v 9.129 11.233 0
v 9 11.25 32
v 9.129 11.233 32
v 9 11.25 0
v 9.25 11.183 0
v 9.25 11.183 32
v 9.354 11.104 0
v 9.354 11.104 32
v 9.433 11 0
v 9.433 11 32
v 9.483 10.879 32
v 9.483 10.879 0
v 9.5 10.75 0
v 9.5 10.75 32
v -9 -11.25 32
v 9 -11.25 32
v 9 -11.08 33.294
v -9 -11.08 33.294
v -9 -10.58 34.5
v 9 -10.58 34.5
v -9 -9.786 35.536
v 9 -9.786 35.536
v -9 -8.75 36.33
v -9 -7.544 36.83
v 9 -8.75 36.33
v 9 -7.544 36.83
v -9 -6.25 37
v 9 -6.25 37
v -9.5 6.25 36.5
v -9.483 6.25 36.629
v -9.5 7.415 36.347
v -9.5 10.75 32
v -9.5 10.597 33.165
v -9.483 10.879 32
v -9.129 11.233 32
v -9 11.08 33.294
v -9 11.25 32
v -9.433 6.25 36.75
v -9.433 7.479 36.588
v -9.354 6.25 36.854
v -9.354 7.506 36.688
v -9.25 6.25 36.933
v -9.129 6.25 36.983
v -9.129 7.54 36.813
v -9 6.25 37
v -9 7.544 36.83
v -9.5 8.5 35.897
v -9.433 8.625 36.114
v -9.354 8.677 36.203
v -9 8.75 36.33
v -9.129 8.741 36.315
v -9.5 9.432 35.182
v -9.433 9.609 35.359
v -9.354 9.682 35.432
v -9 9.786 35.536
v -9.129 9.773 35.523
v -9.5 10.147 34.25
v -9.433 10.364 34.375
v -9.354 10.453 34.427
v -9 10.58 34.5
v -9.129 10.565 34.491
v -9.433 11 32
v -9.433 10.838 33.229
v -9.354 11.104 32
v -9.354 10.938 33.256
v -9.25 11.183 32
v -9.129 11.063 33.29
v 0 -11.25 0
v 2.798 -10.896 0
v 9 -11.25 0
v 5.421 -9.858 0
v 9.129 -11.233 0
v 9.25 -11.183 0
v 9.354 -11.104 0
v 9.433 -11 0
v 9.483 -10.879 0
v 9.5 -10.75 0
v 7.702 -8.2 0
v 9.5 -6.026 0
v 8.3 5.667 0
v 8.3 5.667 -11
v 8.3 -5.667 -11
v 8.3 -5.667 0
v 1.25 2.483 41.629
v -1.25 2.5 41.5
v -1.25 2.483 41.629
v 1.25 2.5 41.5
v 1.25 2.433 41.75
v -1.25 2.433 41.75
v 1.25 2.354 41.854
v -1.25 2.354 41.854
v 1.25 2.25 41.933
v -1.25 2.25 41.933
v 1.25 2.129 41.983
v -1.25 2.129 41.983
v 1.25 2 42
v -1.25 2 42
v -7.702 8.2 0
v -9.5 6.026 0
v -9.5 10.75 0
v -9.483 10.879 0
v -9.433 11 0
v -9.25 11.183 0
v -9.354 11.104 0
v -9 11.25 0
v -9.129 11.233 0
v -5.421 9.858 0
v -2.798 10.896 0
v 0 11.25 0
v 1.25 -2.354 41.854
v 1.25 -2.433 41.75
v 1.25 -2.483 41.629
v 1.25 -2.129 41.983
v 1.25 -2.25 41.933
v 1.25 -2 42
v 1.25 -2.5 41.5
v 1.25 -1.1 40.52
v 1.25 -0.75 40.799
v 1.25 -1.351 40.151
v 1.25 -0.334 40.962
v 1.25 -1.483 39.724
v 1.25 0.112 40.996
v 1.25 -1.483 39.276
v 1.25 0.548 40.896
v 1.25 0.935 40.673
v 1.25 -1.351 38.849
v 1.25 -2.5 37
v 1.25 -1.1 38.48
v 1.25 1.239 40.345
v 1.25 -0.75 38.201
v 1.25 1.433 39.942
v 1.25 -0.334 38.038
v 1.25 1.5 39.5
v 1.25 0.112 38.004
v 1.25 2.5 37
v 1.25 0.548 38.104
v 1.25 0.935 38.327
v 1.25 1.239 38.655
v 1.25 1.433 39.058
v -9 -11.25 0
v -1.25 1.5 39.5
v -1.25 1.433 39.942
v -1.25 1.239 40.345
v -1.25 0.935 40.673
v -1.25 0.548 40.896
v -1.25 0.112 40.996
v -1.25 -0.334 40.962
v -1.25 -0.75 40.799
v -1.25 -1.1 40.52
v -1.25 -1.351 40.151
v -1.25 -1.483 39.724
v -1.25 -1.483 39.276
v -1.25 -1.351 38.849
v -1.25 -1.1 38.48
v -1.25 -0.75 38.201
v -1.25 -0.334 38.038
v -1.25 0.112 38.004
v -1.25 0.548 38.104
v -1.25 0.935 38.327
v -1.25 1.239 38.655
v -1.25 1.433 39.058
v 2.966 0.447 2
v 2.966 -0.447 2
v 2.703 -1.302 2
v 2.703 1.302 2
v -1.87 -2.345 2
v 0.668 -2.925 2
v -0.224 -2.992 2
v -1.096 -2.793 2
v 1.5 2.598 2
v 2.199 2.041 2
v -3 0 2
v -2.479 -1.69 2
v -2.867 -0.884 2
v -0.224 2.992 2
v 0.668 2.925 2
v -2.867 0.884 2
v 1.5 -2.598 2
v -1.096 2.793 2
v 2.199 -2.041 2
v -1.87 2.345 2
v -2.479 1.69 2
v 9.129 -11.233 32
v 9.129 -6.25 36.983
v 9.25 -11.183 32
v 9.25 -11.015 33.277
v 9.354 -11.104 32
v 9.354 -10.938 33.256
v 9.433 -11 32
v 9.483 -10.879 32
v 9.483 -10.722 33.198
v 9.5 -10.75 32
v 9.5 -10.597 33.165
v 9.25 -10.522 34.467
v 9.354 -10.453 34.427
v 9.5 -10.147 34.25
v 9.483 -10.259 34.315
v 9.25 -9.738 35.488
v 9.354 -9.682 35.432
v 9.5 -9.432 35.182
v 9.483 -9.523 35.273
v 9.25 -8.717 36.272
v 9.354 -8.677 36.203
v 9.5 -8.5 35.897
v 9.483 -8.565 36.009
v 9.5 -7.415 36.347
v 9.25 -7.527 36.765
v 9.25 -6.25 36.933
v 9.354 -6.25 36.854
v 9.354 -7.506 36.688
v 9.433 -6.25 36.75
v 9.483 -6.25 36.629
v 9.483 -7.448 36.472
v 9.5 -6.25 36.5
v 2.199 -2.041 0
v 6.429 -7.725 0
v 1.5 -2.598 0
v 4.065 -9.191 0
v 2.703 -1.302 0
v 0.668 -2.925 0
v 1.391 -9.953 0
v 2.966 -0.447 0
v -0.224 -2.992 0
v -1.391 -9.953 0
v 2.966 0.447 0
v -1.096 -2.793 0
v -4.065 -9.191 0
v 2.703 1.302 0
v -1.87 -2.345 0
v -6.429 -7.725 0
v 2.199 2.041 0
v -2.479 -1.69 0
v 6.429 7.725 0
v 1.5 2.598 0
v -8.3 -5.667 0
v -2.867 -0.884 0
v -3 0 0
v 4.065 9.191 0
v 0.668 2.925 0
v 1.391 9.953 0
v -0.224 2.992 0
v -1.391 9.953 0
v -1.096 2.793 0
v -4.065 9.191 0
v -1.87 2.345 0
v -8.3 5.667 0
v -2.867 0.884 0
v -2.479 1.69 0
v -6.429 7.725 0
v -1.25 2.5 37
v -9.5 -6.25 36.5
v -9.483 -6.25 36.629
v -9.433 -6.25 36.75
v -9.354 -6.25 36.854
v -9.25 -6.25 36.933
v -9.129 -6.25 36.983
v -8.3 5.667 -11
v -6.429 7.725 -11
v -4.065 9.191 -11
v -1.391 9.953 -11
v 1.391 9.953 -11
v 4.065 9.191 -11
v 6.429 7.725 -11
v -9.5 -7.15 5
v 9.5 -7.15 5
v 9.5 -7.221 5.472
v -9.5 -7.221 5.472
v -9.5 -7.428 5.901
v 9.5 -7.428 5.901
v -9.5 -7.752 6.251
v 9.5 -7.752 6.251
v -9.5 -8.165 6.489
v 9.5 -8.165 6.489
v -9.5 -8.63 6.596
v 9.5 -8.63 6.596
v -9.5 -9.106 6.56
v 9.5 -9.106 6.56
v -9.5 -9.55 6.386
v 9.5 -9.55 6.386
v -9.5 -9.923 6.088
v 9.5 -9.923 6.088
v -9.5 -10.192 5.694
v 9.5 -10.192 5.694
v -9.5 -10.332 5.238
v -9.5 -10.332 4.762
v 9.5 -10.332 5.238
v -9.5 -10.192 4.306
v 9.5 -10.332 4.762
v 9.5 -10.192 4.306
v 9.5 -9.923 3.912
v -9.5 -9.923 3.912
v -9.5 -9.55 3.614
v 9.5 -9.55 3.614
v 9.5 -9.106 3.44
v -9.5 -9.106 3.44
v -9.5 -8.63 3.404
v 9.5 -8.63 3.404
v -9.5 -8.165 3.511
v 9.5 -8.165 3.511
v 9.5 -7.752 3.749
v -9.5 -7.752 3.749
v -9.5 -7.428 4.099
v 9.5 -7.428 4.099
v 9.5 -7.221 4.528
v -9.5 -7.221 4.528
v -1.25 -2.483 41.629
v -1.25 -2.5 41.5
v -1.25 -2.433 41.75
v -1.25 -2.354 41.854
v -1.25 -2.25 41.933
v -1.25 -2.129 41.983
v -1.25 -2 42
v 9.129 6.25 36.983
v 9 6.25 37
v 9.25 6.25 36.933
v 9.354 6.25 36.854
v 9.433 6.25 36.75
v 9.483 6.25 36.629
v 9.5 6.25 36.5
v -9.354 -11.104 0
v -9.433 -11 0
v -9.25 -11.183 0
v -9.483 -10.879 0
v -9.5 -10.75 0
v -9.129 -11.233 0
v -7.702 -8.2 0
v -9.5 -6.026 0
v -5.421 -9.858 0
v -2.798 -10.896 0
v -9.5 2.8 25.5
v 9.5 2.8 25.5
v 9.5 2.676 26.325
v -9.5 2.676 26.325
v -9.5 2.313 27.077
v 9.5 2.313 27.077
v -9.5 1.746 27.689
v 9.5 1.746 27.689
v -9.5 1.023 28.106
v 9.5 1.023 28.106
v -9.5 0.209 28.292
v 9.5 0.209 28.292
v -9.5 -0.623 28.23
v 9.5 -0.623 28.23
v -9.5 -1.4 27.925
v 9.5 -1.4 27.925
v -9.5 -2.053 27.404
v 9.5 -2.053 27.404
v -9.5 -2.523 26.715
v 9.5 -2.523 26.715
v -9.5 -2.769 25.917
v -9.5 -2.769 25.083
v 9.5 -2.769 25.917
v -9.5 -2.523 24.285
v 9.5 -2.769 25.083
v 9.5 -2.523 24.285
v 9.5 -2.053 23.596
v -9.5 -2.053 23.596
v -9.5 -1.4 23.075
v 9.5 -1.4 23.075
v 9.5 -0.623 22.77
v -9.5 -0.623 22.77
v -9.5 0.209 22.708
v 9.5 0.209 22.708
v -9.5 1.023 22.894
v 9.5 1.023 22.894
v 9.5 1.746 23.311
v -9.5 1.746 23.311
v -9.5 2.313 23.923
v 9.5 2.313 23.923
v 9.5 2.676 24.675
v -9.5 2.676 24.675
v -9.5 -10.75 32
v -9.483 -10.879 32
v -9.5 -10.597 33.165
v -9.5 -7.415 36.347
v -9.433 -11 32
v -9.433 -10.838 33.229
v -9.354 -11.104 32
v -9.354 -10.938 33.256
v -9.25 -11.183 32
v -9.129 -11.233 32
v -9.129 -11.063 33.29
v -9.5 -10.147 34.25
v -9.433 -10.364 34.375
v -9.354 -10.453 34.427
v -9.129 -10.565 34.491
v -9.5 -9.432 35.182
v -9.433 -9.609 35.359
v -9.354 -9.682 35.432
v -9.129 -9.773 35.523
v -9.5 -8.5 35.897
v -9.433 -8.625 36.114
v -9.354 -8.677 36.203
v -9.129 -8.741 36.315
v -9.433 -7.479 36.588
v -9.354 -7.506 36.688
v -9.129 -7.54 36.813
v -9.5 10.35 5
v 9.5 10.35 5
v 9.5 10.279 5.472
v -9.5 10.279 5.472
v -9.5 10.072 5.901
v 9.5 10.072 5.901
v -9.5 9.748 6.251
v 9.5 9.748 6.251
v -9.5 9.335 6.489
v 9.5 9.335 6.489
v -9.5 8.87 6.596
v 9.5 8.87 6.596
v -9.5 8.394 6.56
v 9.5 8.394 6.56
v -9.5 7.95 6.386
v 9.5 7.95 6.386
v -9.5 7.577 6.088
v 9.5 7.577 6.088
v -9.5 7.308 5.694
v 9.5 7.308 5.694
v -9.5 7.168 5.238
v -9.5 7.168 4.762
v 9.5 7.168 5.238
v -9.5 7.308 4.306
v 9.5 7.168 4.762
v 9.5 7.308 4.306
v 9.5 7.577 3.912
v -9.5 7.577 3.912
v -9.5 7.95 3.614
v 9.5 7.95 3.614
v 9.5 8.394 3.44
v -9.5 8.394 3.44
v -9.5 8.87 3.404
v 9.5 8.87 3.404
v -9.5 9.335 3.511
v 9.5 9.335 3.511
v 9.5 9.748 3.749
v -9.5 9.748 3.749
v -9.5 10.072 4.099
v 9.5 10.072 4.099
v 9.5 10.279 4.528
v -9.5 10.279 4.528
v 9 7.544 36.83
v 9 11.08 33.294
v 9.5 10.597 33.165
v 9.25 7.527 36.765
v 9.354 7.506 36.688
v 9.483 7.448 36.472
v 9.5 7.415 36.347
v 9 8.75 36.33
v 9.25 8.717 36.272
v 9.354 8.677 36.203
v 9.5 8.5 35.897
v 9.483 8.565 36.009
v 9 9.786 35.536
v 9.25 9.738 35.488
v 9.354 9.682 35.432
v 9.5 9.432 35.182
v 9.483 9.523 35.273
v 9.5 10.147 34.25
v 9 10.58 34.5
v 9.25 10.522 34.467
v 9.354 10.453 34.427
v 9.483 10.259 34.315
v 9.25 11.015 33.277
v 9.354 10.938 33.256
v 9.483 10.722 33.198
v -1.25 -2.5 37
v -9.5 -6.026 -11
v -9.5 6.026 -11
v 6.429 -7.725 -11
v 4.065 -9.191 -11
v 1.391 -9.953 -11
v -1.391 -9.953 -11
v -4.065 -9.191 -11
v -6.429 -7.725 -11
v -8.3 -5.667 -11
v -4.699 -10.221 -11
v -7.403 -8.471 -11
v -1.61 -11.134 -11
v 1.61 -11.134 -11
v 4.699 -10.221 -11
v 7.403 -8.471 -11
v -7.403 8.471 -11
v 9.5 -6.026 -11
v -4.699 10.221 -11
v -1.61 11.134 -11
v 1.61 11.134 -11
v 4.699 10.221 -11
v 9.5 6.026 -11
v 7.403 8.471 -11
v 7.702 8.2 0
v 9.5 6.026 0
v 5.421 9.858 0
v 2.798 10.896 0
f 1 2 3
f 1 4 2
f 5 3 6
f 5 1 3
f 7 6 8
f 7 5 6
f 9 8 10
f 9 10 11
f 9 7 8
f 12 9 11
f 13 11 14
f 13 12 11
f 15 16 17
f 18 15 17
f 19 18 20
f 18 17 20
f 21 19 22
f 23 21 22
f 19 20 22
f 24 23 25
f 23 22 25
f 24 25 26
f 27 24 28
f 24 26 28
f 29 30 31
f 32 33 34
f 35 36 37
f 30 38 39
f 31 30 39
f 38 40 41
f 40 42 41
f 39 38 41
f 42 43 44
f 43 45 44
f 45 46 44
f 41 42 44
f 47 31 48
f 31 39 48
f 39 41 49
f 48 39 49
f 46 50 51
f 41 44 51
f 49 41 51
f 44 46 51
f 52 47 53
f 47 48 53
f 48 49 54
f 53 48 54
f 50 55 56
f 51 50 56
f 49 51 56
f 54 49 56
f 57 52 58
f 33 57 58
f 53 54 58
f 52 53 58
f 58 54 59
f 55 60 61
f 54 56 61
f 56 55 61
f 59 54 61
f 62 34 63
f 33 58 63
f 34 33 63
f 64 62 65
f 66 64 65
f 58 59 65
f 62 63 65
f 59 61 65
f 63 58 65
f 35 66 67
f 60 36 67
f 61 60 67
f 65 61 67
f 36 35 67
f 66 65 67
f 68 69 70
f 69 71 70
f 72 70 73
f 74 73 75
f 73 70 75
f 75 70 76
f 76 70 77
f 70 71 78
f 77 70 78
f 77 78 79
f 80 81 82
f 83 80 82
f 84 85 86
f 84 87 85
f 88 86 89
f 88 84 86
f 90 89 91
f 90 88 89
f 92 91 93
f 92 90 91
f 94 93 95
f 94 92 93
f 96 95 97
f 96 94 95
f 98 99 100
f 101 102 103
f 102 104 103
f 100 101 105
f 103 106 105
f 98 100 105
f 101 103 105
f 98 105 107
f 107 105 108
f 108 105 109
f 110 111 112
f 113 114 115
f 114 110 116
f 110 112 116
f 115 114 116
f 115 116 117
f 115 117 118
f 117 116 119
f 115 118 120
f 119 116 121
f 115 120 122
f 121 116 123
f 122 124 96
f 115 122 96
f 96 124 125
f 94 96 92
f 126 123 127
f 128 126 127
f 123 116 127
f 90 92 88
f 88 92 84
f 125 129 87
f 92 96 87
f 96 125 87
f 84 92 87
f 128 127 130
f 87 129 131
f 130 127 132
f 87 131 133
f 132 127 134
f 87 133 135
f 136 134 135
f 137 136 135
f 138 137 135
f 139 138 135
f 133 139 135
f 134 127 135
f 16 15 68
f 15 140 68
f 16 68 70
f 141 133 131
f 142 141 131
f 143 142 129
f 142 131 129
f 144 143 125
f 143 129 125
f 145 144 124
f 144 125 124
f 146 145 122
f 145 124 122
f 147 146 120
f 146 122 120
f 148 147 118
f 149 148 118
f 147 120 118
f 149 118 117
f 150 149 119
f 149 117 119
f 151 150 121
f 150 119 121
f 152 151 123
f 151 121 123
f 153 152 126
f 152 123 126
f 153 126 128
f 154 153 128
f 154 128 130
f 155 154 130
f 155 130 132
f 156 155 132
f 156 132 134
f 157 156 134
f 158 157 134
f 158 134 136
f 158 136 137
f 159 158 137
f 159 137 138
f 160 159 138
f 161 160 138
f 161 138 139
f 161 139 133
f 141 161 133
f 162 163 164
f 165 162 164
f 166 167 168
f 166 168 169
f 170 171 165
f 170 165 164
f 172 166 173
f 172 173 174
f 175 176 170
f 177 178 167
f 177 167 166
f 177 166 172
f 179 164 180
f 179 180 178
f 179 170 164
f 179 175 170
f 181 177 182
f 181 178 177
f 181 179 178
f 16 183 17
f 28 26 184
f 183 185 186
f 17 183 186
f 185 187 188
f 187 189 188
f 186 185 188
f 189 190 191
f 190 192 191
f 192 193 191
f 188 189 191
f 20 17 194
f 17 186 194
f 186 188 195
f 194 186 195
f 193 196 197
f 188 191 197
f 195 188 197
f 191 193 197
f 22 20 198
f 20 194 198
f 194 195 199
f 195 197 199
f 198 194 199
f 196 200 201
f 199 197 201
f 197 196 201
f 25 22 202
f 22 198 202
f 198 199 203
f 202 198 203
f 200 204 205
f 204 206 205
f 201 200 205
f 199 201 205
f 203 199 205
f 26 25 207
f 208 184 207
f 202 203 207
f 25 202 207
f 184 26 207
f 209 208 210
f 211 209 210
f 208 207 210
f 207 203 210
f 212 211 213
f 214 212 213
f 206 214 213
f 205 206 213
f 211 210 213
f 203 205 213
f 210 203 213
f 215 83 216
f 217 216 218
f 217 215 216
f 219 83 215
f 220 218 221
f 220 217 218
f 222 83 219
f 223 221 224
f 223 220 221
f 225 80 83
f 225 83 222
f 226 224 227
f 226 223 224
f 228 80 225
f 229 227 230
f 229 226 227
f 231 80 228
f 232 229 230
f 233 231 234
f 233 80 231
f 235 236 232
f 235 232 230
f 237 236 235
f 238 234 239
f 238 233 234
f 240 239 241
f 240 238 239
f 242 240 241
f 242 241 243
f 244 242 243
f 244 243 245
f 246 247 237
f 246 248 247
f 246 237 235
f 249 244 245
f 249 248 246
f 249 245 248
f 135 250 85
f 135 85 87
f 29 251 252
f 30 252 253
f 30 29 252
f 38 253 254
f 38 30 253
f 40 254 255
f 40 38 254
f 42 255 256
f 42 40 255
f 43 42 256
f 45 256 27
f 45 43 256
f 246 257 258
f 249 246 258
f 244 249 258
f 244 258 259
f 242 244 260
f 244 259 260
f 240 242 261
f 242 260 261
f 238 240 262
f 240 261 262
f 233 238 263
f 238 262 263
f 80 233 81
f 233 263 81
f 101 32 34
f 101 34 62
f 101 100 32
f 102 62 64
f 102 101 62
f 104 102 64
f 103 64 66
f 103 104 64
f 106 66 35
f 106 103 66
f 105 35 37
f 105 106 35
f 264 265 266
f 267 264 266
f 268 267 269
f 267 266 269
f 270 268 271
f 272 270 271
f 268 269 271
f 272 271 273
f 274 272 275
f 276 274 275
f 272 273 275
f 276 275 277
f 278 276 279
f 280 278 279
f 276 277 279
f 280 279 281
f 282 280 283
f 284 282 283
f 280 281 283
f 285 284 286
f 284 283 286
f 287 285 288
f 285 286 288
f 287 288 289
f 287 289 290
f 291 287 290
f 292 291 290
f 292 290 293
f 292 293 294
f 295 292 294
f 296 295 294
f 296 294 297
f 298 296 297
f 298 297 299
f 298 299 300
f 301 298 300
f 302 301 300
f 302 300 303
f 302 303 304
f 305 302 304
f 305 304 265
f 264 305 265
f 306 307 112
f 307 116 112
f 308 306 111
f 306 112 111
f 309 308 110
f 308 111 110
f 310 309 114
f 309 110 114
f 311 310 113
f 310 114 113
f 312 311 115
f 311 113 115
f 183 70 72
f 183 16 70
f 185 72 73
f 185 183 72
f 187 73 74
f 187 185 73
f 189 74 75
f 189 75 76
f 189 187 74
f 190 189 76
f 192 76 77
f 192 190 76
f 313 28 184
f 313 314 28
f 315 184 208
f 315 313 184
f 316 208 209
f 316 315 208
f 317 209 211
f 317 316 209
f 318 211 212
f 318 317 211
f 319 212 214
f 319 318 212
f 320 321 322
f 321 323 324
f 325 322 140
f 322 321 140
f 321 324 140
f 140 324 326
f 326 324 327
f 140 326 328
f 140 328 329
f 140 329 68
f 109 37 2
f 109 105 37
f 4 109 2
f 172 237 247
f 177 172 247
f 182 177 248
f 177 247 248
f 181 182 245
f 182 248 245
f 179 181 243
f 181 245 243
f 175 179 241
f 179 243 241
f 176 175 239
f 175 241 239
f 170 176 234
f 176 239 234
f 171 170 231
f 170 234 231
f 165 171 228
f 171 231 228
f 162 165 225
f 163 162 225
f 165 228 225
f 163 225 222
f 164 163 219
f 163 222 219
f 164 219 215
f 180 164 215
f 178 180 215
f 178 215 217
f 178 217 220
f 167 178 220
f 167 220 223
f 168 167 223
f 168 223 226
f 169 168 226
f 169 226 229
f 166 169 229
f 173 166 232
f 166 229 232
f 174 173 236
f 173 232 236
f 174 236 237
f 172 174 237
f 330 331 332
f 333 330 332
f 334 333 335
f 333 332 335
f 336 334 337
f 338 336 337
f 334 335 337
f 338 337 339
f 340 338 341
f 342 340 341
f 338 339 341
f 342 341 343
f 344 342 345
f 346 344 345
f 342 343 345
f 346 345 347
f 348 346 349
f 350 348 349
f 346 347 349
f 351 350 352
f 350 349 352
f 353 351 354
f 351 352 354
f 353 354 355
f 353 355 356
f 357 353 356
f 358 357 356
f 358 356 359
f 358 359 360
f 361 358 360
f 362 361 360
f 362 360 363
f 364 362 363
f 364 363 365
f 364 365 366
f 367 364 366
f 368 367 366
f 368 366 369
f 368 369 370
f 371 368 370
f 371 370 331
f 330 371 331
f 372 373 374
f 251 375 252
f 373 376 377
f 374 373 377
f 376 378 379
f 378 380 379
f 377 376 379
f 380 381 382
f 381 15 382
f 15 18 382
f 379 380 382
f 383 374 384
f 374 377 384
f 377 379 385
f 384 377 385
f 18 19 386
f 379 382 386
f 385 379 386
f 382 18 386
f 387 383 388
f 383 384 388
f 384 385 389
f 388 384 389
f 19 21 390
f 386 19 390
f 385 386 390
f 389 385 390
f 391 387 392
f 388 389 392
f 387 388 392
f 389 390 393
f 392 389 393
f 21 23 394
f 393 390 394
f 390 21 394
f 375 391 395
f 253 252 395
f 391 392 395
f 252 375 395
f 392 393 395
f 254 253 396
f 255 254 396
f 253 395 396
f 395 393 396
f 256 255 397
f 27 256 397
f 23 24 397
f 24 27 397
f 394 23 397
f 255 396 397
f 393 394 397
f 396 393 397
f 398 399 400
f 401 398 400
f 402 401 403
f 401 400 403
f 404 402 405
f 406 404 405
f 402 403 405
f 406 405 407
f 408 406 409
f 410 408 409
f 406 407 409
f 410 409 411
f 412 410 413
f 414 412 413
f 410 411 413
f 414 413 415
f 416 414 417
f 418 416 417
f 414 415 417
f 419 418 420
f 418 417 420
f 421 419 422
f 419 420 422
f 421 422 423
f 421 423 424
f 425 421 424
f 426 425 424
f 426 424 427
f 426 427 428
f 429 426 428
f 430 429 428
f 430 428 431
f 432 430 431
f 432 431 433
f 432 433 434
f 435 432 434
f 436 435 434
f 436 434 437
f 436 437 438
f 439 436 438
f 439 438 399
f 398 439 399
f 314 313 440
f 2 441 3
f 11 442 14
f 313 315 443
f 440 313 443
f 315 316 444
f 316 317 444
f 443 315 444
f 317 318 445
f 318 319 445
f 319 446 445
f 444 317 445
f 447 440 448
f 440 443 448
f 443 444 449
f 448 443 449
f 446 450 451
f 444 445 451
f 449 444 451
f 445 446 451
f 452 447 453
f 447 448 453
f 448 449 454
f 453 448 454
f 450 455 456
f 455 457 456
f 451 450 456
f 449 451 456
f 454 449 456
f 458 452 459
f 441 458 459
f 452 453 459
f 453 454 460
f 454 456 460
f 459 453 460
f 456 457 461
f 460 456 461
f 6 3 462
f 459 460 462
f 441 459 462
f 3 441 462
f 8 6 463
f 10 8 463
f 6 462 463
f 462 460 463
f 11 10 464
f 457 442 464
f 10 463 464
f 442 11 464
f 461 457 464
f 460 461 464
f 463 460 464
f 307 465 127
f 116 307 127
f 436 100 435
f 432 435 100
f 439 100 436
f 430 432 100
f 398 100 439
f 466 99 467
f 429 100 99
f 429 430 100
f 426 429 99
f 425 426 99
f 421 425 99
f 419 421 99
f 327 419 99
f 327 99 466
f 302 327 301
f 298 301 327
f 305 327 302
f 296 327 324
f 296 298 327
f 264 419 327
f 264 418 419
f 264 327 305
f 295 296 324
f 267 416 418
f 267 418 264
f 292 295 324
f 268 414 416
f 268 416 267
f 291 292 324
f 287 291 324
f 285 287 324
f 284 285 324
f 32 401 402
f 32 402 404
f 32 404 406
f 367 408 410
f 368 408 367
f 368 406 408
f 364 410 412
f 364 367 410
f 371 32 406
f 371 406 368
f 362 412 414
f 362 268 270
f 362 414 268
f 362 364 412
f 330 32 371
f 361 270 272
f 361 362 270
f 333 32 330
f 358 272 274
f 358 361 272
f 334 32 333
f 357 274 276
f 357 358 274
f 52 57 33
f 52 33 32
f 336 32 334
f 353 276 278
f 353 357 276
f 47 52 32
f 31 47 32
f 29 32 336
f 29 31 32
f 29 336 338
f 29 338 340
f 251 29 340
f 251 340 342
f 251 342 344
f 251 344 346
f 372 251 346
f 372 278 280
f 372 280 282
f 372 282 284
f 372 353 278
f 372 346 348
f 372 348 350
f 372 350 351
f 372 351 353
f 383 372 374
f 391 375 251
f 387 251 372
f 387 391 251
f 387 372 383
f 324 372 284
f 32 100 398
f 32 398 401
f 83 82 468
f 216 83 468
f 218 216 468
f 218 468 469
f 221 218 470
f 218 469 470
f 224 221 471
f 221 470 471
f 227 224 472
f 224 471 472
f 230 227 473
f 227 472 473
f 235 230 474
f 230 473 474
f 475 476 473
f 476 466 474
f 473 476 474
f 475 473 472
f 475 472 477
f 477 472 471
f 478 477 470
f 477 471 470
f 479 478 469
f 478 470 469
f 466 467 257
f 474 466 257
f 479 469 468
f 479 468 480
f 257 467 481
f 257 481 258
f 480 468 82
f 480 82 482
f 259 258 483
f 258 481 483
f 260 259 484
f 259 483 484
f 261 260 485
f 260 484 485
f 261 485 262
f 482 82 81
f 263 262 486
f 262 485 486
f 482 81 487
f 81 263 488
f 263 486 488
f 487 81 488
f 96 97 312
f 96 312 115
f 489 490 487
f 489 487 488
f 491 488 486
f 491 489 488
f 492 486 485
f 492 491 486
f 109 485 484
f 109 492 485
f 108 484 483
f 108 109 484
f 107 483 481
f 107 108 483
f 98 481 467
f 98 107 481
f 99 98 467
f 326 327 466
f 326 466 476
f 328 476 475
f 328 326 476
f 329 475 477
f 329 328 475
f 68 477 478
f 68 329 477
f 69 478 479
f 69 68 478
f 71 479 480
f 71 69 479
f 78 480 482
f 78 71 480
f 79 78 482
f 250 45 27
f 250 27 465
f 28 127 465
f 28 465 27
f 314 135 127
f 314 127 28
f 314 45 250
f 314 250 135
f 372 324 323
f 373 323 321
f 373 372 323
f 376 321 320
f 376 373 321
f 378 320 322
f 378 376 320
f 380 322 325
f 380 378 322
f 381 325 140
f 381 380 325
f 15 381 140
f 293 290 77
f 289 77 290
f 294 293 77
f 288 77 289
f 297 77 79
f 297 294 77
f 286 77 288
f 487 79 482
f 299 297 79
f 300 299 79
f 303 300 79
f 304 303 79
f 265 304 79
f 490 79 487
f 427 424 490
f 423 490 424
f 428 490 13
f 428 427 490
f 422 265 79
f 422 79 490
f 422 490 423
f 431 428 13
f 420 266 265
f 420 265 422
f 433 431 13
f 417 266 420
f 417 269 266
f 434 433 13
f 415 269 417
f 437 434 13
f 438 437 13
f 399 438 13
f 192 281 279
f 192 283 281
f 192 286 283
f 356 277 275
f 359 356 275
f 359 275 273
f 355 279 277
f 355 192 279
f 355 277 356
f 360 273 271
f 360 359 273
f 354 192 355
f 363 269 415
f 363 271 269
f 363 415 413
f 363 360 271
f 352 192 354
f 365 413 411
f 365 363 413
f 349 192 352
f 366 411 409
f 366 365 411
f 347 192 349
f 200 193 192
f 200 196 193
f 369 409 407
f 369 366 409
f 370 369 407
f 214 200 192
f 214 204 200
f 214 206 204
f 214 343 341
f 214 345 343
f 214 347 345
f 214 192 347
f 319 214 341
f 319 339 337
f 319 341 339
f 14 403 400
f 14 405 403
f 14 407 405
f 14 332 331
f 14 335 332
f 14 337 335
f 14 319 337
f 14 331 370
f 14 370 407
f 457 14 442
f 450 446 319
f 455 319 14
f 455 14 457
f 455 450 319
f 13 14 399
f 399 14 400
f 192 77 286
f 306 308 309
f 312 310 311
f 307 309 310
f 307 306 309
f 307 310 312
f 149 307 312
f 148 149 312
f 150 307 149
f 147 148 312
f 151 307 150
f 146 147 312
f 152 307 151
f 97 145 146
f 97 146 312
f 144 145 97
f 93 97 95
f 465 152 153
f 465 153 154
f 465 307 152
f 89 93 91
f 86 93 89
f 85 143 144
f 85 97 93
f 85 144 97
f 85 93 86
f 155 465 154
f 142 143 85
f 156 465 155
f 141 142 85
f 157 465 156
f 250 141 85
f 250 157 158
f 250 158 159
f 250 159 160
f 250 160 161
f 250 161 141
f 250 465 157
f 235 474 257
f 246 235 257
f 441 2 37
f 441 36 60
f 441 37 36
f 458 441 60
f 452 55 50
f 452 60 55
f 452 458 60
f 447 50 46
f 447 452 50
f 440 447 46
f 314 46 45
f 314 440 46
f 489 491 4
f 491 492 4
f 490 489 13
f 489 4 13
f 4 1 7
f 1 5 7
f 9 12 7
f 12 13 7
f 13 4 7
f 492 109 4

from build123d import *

# Parameters (mm, degrees)
SKETCH1_W           = 19
SKETCH1_H           = 22.5
BOSS_EXTRUDE1_DEPTH = 37
BOSS_EXTRUDE2_DEPTH = 11
FILLET1_R           = 5
SKETCH3_R           = 1.6
CUT_EXTRUDE1_DEPTH  = 44.087846314
SKETCH4_W           = 2.5
SKETCH4_H           = 5
BOSS_EXTRUDE3_DEPTH = 5
FILLET2_R           = 0.5
SKETCH5_R           = 1.5
CUT_EXTRUDE2_DEPTH  = 5
SKETCH6_R           = 2.8
CUT_EXTRUDE3_DEPTH  = 48.450632264
CUT_EXTRUDE4_DEPTH  = 11
SKETCH8_R           = 3
CUT_EXTRUDE5_DEPTH  = 2


with BuildPart() as part:
    # Sketch1 → Boss-Extrude1 (new body)
    with BuildSketch(Plane.XY):
        Rectangle(SKETCH1_W, SKETCH1_H)
    extrude(amount=BOSS_EXTRUDE1_DEPTH)

    # Sketch2 → Boss-Extrude2 (add)
    with BuildSketch(Plane(origin=(0, 0, 0), x_dir=(-1, 0, 0), z_dir=(0, 0, -1))):
        with BuildLine():
            Line((9.5, 6.025985397), (9.5, -6.025985397))
            ThreePointArc((9.5, -6.025985397), (0, -11.25), (-9.5, -6.025985397))
            Line((-9.5, -6.025985397), (-9.5, 6.025985397))
            ThreePointArc((-9.5, 6.025985397), (0, 11.25), (9.5, 6.025985397))
        make_face()
    extrude(amount=BOSS_EXTRUDE2_DEPTH)

    # Fillet1
    fillet1_edges = [part.edges().sort_by_distance(p)[0] for p in [
        (0, 11.25, 37),
        (0, -11.25, 37),
    ]]
    fillet(fillet1_edges, radius=FILLET1_R)

    # Sketch3 → Cut-Extrude1 (cut, through all)
    with BuildSketch(Plane(origin=(9.5, 0, 0), x_dir=(0, 0, -1), z_dir=(1, 0, 0))):
        with Locations(Location((-5, 8.75, 0), (0, 0, 90))):
            Circle(SKETCH3_R)
        with Locations(Location((-5, -8.75, 0), (0, 0, 90))):
            Circle(SKETCH3_R)
    extrude(amount=-CUT_EXTRUDE1_DEPTH, mode=Mode.SUBTRACT)

    # Sketch4 → Boss-Extrude3 (add)
    with BuildSketch(Plane.XY.offset(37)):
        Rectangle(SKETCH4_W, SKETCH4_H)
    extrude(amount=BOSS_EXTRUDE3_DEPTH)

    # Fillet2
    fillet2_edges = [part.edges().sort_by_distance(p)[0] for p in [
        (-9.5, 0, 37),
        (9.5, 0, 37),
        (9.5, 11.25, 16),
        (9.5, -11.25, 16),
        (9.5, 9.785533906, 35.535533906),
        (9.5, -9.785533906, 35.535533906),
        (-9.5, -11.25, 16),
        (-9.5, 11.25, 16),
        (-9.5, 9.785533906, 35.535533906),
        (-9.5, -9.785533906, 35.535533906),
        (0, -2.5, 42),
        (0, 2.5, 42),
    ]]
    fillet(fillet2_edges, radius=FILLET2_R)

    # Sketch5 → Cut-Extrude2 (cut)
    with BuildSketch(Plane(origin=(1.25, 0, 0), x_dir=(0, 0, -1), z_dir=(1, 0, 0))):
        with Locations(Location((-39.5, 0, 0), (0, 0, 90))):
            Circle(SKETCH5_R)
    extrude(amount=-CUT_EXTRUDE2_DEPTH, mode=Mode.SUBTRACT)

    # Sketch6 → Cut-Extrude3 (cut, through all)
    with BuildSketch(Plane(origin=(9.5, 0, 0), x_dir=(0, 0, -1), z_dir=(1, 0, 0))):
        with Locations(Location((-25.5, 0, 0), (0, 0, 90))):
            Circle(SKETCH6_R)
    extrude(amount=-CUT_EXTRUDE3_DEPTH, mode=Mode.SUBTRACT)

    # Sketch7 → Cut-Extrude4 (cut)
    with BuildSketch(Plane(origin=(0, 0, -11), x_dir=(-1, 0, 0), z_dir=(0, 0, -1))):
        with BuildLine():
            Line((-8.3, 5.666789214), (-8.3, -5.666789214))
            ThreePointArc((-8.3, -5.666789214), (0, -10.05), (8.3, -5.666789214))
            Line((8.3, -5.666789214), (8.3, 5.666789214))
            ThreePointArc((8.3, 5.666789214), (0, 10.05), (-8.3, 5.666789214))
        make_face()
    extrude(amount=-CUT_EXTRUDE4_DEPTH, mode=Mode.SUBTRACT)

    # Sketch8 → Cut-Extrude5 (cut)
    with BuildSketch(Plane(origin=(0, 0, 0), x_dir=(-1, 0, 0), z_dir=(0, 0, -1))):
        Circle(SKETCH8_R)
    extrude(amount=-CUT_EXTRUDE5_DEPTH, mode=Mode.SUBTRACT)


solid = part.part
